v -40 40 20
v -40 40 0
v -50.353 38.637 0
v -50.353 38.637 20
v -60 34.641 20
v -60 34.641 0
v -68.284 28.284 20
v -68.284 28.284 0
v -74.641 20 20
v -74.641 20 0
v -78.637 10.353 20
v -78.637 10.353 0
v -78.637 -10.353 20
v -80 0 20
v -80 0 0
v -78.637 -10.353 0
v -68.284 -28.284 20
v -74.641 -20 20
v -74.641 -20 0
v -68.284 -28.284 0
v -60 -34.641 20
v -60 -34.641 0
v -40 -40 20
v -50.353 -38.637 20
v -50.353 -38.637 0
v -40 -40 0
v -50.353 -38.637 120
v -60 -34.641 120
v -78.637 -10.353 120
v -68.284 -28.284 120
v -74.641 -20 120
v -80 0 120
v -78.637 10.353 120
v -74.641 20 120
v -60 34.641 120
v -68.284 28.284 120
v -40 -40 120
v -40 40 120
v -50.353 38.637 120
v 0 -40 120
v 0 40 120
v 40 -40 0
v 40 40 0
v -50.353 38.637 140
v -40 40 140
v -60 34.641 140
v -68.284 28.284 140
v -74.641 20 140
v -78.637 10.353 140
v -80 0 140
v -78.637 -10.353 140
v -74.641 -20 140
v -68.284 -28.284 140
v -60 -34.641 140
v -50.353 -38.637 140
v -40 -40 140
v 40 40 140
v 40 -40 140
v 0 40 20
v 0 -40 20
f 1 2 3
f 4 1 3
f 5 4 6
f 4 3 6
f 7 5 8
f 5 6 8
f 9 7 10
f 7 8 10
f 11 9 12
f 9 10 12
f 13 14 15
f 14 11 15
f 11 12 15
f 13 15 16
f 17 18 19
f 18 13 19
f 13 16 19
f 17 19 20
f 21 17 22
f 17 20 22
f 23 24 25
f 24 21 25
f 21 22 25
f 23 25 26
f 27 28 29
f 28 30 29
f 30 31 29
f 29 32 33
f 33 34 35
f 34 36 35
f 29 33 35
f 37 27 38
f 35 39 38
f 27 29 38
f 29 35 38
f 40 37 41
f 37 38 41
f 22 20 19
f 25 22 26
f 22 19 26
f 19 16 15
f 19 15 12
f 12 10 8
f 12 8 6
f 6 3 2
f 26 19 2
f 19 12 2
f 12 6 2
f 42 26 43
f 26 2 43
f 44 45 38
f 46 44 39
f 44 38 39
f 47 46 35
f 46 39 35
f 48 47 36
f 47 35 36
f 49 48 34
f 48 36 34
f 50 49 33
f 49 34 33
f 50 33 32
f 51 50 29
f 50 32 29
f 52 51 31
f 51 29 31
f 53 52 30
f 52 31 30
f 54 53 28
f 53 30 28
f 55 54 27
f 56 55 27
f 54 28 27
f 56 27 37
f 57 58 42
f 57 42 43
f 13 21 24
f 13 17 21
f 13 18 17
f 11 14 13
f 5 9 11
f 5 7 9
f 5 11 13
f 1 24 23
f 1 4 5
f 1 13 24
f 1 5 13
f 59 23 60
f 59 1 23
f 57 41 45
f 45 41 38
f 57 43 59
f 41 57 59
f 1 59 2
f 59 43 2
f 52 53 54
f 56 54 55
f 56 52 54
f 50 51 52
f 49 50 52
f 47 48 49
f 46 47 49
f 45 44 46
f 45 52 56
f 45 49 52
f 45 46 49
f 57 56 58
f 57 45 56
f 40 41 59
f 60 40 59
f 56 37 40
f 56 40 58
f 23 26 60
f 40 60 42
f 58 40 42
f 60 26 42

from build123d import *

# Parameters (mm, degrees)
ESTRUSIONE_ESTRUSIONE1_DEPTH = 140
SCHIZZO2_W                   = 160
SCHIZZO2_H                   = 100
TAGLIO_ESTRUSIONE1_DEPTH     = 140


with BuildPart() as part:
    # Schizzo1 → Estrusione-Estrusione1 (new body)
    with BuildSketch(Plane.XY):
        with BuildLine():
            Line((40, 40), (-40, 40))
            ThreePointArc((-40, 40), (-80, 0), (-40, -40))
            Line((-40, -40), (40, -40))
            Line((40, -40), (40, 40))
        make_face()
    extrude(amount=ESTRUSIONE_ESTRUSIONE1_DEPTH)

    # Schizzo2 → Taglio-Estrusione1 (cut)
    with BuildSketch(Plane(origin=(0, 40, 0), x_dir=(1, 0, 0), z_dir=(0, 1, 0))):
        with Locations((-80, -70)):
            Rectangle(SCHIZZO2_W, SCHIZZO2_H)
    extrude(amount=-TAGLIO_ESTRUSIONE1_DEPTH, mode=Mode.SUBTRACT)


solid = part.part
